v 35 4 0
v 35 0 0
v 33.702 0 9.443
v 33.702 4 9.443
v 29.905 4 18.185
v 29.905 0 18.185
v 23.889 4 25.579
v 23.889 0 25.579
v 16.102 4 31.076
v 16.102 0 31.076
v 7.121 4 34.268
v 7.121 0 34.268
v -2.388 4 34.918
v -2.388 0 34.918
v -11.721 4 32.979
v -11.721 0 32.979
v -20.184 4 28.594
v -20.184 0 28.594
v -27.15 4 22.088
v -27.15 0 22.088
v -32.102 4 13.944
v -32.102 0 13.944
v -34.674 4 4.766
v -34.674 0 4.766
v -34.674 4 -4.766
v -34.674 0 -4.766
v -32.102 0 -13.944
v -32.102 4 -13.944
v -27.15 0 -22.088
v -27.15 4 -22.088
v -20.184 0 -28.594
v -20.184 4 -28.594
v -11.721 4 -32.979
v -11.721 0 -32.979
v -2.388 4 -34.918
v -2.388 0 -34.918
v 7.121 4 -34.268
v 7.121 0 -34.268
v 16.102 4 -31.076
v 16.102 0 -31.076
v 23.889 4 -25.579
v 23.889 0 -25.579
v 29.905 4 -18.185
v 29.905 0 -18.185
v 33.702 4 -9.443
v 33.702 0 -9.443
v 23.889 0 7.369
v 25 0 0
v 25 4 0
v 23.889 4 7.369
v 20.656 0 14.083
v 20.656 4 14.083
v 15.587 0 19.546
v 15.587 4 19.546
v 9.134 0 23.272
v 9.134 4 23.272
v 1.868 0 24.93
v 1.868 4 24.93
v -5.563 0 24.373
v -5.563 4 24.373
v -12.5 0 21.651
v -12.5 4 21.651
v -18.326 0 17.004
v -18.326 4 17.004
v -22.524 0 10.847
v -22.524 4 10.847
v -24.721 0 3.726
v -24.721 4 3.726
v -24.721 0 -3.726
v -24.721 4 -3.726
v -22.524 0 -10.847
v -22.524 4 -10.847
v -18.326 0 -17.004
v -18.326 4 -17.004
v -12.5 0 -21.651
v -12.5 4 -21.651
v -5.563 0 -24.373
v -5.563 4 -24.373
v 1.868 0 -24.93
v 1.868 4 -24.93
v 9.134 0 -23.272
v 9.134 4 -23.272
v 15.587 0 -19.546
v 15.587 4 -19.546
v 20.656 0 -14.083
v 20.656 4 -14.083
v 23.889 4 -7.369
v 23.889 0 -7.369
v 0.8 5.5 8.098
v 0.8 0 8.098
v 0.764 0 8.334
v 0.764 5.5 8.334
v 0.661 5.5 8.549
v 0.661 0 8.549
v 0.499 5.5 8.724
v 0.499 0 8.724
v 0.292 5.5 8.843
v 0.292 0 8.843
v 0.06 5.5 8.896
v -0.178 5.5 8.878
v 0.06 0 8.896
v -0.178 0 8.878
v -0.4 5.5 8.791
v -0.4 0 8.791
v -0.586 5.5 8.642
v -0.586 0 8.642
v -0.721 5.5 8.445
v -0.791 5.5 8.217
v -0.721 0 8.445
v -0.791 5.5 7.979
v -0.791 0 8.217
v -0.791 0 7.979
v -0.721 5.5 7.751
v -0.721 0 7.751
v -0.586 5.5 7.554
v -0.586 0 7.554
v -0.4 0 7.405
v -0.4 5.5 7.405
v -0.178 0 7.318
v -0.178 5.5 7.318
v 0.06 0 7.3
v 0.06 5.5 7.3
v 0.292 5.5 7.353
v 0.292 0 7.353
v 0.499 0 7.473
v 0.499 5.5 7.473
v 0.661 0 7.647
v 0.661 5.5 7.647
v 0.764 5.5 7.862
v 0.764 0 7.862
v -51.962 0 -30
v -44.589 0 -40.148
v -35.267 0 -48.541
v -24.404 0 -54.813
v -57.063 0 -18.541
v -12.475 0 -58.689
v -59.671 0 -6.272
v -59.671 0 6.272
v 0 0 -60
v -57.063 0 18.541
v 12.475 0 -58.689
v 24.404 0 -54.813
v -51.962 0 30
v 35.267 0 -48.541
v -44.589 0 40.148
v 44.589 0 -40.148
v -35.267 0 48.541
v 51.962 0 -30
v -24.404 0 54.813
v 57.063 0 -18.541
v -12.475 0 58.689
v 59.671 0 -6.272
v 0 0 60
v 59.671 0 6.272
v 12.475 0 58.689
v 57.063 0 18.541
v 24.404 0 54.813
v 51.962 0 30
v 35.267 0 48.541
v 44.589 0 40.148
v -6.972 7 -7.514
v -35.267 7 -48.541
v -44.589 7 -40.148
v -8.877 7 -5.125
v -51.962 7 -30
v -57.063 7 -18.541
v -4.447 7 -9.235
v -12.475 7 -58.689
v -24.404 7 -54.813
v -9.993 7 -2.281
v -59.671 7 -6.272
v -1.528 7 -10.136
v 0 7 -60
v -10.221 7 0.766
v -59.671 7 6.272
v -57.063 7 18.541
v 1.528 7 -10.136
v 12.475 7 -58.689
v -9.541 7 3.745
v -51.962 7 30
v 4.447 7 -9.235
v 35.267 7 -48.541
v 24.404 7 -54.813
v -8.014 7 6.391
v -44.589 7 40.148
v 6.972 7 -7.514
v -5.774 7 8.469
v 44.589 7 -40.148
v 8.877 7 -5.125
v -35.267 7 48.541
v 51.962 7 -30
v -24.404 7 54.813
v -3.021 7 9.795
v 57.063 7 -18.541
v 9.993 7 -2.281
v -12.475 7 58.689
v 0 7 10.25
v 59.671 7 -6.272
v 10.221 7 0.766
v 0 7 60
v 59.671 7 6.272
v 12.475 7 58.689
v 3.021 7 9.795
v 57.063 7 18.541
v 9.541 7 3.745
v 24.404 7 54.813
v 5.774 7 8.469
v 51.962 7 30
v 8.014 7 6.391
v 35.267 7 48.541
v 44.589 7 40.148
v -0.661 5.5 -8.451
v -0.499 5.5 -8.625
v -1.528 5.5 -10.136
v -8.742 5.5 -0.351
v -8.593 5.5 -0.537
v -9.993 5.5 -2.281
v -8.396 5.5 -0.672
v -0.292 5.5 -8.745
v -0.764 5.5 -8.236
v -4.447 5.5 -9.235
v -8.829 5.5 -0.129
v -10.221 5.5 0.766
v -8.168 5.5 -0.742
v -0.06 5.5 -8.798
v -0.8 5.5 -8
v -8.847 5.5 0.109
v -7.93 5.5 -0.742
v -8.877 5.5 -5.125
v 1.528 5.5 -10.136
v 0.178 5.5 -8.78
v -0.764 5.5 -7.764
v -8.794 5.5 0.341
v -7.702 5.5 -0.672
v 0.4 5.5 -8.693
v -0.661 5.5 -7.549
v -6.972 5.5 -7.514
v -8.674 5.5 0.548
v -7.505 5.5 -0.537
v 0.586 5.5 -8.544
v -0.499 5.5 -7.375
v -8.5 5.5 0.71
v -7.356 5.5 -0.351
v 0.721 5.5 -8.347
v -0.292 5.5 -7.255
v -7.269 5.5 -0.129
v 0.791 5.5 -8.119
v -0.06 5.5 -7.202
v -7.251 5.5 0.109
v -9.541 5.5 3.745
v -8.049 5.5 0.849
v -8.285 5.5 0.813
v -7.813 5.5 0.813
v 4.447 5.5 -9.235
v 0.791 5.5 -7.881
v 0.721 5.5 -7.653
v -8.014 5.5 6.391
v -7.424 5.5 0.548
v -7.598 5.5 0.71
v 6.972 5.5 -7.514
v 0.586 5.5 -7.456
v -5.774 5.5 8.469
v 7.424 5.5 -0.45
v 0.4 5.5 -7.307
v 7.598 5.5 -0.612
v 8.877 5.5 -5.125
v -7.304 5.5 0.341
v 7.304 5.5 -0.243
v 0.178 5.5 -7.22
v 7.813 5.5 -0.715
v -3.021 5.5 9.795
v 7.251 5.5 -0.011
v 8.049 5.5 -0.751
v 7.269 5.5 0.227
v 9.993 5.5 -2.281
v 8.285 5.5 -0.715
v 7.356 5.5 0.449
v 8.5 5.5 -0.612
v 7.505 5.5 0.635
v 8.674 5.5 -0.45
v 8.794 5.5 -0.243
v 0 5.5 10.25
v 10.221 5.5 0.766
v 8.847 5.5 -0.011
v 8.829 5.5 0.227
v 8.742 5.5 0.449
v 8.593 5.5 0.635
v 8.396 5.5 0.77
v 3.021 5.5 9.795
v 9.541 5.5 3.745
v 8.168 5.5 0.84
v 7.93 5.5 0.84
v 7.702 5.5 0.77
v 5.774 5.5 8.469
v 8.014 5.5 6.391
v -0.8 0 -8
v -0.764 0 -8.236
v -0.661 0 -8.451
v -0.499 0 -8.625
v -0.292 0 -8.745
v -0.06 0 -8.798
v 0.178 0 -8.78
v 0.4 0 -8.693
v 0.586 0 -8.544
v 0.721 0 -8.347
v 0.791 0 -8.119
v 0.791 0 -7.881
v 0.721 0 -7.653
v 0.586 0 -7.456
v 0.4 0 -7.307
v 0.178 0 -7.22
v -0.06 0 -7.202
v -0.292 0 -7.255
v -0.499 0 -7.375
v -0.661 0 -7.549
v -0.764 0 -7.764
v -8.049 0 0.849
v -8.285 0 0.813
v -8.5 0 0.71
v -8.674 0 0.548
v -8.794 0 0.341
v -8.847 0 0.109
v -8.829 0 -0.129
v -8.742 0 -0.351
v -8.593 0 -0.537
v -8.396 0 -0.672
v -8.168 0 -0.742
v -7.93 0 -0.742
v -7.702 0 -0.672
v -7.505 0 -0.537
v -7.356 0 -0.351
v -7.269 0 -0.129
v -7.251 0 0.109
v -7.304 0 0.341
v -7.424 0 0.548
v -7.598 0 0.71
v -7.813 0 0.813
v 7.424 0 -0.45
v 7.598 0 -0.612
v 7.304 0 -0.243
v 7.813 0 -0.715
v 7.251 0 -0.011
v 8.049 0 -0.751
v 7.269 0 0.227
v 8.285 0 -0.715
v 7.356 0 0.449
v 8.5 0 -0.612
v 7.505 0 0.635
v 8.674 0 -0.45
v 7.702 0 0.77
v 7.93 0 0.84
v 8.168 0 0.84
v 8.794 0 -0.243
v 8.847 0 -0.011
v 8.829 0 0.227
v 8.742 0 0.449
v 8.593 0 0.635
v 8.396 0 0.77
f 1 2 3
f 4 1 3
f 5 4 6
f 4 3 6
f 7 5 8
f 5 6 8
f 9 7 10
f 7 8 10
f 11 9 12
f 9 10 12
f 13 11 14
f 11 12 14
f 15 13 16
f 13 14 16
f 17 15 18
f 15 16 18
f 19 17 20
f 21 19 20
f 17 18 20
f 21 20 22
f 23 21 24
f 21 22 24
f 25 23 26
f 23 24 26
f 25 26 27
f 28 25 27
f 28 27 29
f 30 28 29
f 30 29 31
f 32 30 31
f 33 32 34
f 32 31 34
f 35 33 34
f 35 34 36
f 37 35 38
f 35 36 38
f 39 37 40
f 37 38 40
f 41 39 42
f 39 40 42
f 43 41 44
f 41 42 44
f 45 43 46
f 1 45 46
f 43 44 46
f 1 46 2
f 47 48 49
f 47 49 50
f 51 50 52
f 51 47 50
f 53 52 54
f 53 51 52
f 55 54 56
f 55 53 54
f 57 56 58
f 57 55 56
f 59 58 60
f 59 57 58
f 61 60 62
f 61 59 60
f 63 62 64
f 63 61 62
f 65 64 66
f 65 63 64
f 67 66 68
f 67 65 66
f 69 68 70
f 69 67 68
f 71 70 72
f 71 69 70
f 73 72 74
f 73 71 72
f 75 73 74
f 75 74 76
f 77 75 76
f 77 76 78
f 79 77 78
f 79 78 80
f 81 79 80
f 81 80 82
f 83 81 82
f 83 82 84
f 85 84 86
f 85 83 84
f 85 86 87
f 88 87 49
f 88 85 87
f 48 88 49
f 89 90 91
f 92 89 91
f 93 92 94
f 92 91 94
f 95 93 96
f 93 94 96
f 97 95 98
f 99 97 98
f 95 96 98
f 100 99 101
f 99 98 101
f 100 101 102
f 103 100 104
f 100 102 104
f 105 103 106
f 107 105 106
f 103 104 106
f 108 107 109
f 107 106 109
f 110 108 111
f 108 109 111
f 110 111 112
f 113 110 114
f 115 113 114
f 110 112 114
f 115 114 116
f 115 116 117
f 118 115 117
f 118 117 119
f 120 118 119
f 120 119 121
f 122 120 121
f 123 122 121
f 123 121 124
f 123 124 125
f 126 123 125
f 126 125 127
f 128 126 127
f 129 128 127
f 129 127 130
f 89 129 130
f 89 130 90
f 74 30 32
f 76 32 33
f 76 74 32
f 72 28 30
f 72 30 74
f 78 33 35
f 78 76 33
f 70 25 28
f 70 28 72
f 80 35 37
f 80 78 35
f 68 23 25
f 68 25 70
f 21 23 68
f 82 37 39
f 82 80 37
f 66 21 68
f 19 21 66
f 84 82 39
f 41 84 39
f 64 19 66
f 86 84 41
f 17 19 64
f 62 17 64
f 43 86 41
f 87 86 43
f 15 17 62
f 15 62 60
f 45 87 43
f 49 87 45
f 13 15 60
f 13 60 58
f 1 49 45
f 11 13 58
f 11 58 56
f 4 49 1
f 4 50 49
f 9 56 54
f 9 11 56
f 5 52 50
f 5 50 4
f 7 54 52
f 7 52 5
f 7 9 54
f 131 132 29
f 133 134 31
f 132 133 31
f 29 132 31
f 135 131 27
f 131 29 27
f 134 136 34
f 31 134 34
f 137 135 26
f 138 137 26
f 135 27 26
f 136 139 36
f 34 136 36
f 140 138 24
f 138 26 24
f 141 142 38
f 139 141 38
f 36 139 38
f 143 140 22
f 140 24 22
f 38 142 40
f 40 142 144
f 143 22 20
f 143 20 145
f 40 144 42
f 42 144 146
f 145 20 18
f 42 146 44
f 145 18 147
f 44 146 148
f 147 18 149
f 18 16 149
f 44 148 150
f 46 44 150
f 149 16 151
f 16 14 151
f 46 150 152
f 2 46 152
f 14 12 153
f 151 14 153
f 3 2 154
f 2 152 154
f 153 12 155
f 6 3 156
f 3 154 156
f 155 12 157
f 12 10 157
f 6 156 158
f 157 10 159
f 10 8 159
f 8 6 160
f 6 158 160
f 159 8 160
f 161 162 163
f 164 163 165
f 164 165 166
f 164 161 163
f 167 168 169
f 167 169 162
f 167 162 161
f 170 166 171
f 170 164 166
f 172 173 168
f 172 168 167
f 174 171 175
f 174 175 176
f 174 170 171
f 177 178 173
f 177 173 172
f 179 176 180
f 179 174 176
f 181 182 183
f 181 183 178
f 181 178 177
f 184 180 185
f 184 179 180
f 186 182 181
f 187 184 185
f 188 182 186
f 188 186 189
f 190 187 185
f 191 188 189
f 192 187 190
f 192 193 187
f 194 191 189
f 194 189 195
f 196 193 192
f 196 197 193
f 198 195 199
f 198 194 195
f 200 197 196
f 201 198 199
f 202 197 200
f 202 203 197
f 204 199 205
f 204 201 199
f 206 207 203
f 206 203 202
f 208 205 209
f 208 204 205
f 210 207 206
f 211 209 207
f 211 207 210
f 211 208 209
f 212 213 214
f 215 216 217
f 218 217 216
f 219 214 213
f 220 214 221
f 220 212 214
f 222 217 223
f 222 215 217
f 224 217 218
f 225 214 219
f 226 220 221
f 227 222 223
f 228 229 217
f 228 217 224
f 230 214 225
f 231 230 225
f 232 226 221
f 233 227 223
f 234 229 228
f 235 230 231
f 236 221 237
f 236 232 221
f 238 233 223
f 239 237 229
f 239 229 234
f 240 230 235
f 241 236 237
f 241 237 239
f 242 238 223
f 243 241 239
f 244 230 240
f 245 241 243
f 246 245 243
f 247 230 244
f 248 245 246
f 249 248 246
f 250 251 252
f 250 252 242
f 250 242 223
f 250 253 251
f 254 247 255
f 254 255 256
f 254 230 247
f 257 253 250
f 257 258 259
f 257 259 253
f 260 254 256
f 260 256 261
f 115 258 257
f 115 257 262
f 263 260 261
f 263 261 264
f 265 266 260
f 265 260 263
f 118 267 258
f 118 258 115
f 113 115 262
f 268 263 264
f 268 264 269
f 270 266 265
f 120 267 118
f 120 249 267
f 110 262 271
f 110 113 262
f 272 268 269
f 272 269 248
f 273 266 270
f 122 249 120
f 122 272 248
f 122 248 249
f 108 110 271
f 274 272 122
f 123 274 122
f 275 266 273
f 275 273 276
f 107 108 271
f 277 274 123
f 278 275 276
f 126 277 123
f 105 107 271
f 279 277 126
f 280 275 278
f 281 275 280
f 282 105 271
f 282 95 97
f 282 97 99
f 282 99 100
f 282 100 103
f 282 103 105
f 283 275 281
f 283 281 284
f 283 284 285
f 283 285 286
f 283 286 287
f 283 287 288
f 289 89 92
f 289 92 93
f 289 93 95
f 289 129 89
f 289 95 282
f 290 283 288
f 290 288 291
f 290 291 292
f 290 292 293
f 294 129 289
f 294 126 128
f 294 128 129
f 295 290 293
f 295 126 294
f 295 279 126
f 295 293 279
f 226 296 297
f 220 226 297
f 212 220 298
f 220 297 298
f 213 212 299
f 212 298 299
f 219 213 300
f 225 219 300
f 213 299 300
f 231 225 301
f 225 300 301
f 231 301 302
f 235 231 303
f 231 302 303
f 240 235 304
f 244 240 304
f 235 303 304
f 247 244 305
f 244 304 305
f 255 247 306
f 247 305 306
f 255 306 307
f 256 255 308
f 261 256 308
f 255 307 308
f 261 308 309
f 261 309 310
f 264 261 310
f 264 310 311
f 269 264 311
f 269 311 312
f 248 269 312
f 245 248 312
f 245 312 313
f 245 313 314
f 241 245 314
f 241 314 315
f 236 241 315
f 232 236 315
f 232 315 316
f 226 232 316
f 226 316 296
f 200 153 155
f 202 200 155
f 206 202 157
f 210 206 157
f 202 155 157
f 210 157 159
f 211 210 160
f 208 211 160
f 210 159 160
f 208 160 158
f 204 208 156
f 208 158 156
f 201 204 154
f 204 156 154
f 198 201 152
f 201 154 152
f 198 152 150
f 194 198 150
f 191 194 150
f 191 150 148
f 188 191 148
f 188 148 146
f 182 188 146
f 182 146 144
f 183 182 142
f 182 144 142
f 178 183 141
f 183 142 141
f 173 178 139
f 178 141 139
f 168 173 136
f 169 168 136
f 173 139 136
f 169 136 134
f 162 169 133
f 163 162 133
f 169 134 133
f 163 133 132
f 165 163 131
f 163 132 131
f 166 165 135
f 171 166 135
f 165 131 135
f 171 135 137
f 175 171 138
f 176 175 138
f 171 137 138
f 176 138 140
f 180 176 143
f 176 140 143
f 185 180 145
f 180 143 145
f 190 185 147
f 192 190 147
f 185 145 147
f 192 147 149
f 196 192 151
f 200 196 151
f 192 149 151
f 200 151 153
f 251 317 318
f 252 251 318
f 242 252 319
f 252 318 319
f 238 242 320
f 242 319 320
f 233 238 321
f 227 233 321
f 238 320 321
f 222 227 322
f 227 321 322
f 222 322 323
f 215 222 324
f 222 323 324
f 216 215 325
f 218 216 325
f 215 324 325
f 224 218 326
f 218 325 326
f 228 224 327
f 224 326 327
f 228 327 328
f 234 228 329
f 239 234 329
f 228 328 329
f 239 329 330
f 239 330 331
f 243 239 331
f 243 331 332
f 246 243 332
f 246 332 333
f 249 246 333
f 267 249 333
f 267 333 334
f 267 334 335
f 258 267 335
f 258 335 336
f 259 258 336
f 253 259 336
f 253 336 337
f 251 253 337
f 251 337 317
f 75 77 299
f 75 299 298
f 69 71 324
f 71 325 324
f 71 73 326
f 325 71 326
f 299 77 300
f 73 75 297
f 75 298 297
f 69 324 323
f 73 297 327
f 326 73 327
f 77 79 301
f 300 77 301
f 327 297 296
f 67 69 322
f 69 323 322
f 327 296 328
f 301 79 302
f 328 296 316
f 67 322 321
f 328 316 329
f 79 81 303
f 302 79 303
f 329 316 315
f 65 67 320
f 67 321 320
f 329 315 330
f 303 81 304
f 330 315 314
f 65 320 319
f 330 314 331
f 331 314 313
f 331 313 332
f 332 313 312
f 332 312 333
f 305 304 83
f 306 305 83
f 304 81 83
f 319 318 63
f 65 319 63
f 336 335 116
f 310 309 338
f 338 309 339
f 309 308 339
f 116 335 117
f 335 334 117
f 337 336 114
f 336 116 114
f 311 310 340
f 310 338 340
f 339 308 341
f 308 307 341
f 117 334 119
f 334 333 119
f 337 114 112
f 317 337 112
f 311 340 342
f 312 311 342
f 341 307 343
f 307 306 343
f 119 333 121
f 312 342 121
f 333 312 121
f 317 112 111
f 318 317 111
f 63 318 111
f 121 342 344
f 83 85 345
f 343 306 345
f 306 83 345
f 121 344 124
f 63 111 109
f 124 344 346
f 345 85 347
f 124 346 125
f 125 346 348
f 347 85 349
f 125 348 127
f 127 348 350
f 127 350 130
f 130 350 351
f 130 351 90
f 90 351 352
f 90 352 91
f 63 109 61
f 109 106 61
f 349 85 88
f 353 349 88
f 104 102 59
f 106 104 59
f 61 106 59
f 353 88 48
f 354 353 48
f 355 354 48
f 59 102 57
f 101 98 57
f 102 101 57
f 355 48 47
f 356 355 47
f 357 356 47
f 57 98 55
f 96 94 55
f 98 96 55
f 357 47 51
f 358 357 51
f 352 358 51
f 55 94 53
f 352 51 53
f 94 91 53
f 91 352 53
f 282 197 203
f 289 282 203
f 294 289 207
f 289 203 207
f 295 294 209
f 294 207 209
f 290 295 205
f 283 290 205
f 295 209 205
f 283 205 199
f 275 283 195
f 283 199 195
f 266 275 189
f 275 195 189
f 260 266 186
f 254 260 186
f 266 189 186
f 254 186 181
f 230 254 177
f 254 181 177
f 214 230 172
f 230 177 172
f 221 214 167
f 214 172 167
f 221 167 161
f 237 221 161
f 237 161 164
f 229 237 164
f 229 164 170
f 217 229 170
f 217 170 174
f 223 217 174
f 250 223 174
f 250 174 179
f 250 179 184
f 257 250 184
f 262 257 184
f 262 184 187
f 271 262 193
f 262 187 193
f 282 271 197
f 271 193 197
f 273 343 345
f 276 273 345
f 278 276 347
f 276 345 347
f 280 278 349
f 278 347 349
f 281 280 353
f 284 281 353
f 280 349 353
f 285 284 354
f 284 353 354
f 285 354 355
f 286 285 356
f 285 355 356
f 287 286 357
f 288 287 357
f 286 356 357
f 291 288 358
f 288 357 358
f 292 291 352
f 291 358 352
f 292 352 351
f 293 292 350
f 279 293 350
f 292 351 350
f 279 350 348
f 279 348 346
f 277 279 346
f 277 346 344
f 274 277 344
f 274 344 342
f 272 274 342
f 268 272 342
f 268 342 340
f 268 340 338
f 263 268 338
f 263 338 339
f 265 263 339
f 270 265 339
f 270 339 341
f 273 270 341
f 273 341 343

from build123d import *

# Parameters (mm, degrees)
SKETCH1_R                   = 60
BOSS_EXTRUDE1_DEPTH         = 7
SKETCH2_R                   = 10.25
CUT_EXTRUDE1_DEPTH          = 1.5
TAP_DRILL_FOR_M2X0_4_TAP1_D = 1.6
CIRPATTERN1_COUNT           = 4
SKETCH8_R                   = 35
SKETCH8_R_2                 = 25
CUT_EXTRUDE_THIN1_DEPTH     = 4


with BuildPart() as part:
    # Sketch1 → Boss-Extrude1 (new body)
    with BuildSketch(Plane(origin=(0, 0, 0), x_dir=(1, 0, 0), z_dir=(0, 1, 0))):
        with Locations(Location((0, 0, 0), (0, 0, 270))):
            Circle(SKETCH1_R)
    extrude(amount=BOSS_EXTRUDE1_DEPTH)

    # Sketch2 → Cut-Extrude1 (cut)
    with BuildSketch(Plane(origin=(0, 7, 0), x_dir=(1, 0, 0), z_dir=(0, 1, 0))):
        with Locations(Location((0, 0, 0), (0, 0, 270))):
            Circle(SKETCH2_R)
    extrude(amount=-CUT_EXTRUDE1_DEPTH, mode=Mode.SUBTRACT)

    # Tap Drill for M2x0.4 Tap1 (through all)
    with Locations(Plane(origin=(0, 5.5, 0), x_dir=(1, 0, 0), z_dir=(0, 1, 0))):
        with Locations((0, 8)):
            tap_drill_for_m2x0_4_tap1 = Hole(TAP_DRILL_FOR_M2X0_4_TAP1_D / 2)

    # CirPattern1: Tap Drill for M2x0.4 Tap1 ×4 about axis
    cirpattern1_axis = Axis((0, 0, 0.049031578), (0, 1, 0))
    for i in range(1, CIRPATTERN1_COUNT):
        add(tap_drill_for_m2x0_4_tap1.rotate(cirpattern1_axis, i * 360 / CIRPATTERN1_COUNT), mode=Mode.SUBTRACT)

    # Sketch8 → Cut-Extrude-Thin1 (cut)
    with BuildSketch(Plane.XZ):
        Circle(SKETCH8_R)
        Circle(SKETCH8_R_2, mode=Mode.SUBTRACT)
    extrude(amount=-CUT_EXTRUDE_THIN1_DEPTH, mode=Mode.SUBTRACT)


solid = part.part
